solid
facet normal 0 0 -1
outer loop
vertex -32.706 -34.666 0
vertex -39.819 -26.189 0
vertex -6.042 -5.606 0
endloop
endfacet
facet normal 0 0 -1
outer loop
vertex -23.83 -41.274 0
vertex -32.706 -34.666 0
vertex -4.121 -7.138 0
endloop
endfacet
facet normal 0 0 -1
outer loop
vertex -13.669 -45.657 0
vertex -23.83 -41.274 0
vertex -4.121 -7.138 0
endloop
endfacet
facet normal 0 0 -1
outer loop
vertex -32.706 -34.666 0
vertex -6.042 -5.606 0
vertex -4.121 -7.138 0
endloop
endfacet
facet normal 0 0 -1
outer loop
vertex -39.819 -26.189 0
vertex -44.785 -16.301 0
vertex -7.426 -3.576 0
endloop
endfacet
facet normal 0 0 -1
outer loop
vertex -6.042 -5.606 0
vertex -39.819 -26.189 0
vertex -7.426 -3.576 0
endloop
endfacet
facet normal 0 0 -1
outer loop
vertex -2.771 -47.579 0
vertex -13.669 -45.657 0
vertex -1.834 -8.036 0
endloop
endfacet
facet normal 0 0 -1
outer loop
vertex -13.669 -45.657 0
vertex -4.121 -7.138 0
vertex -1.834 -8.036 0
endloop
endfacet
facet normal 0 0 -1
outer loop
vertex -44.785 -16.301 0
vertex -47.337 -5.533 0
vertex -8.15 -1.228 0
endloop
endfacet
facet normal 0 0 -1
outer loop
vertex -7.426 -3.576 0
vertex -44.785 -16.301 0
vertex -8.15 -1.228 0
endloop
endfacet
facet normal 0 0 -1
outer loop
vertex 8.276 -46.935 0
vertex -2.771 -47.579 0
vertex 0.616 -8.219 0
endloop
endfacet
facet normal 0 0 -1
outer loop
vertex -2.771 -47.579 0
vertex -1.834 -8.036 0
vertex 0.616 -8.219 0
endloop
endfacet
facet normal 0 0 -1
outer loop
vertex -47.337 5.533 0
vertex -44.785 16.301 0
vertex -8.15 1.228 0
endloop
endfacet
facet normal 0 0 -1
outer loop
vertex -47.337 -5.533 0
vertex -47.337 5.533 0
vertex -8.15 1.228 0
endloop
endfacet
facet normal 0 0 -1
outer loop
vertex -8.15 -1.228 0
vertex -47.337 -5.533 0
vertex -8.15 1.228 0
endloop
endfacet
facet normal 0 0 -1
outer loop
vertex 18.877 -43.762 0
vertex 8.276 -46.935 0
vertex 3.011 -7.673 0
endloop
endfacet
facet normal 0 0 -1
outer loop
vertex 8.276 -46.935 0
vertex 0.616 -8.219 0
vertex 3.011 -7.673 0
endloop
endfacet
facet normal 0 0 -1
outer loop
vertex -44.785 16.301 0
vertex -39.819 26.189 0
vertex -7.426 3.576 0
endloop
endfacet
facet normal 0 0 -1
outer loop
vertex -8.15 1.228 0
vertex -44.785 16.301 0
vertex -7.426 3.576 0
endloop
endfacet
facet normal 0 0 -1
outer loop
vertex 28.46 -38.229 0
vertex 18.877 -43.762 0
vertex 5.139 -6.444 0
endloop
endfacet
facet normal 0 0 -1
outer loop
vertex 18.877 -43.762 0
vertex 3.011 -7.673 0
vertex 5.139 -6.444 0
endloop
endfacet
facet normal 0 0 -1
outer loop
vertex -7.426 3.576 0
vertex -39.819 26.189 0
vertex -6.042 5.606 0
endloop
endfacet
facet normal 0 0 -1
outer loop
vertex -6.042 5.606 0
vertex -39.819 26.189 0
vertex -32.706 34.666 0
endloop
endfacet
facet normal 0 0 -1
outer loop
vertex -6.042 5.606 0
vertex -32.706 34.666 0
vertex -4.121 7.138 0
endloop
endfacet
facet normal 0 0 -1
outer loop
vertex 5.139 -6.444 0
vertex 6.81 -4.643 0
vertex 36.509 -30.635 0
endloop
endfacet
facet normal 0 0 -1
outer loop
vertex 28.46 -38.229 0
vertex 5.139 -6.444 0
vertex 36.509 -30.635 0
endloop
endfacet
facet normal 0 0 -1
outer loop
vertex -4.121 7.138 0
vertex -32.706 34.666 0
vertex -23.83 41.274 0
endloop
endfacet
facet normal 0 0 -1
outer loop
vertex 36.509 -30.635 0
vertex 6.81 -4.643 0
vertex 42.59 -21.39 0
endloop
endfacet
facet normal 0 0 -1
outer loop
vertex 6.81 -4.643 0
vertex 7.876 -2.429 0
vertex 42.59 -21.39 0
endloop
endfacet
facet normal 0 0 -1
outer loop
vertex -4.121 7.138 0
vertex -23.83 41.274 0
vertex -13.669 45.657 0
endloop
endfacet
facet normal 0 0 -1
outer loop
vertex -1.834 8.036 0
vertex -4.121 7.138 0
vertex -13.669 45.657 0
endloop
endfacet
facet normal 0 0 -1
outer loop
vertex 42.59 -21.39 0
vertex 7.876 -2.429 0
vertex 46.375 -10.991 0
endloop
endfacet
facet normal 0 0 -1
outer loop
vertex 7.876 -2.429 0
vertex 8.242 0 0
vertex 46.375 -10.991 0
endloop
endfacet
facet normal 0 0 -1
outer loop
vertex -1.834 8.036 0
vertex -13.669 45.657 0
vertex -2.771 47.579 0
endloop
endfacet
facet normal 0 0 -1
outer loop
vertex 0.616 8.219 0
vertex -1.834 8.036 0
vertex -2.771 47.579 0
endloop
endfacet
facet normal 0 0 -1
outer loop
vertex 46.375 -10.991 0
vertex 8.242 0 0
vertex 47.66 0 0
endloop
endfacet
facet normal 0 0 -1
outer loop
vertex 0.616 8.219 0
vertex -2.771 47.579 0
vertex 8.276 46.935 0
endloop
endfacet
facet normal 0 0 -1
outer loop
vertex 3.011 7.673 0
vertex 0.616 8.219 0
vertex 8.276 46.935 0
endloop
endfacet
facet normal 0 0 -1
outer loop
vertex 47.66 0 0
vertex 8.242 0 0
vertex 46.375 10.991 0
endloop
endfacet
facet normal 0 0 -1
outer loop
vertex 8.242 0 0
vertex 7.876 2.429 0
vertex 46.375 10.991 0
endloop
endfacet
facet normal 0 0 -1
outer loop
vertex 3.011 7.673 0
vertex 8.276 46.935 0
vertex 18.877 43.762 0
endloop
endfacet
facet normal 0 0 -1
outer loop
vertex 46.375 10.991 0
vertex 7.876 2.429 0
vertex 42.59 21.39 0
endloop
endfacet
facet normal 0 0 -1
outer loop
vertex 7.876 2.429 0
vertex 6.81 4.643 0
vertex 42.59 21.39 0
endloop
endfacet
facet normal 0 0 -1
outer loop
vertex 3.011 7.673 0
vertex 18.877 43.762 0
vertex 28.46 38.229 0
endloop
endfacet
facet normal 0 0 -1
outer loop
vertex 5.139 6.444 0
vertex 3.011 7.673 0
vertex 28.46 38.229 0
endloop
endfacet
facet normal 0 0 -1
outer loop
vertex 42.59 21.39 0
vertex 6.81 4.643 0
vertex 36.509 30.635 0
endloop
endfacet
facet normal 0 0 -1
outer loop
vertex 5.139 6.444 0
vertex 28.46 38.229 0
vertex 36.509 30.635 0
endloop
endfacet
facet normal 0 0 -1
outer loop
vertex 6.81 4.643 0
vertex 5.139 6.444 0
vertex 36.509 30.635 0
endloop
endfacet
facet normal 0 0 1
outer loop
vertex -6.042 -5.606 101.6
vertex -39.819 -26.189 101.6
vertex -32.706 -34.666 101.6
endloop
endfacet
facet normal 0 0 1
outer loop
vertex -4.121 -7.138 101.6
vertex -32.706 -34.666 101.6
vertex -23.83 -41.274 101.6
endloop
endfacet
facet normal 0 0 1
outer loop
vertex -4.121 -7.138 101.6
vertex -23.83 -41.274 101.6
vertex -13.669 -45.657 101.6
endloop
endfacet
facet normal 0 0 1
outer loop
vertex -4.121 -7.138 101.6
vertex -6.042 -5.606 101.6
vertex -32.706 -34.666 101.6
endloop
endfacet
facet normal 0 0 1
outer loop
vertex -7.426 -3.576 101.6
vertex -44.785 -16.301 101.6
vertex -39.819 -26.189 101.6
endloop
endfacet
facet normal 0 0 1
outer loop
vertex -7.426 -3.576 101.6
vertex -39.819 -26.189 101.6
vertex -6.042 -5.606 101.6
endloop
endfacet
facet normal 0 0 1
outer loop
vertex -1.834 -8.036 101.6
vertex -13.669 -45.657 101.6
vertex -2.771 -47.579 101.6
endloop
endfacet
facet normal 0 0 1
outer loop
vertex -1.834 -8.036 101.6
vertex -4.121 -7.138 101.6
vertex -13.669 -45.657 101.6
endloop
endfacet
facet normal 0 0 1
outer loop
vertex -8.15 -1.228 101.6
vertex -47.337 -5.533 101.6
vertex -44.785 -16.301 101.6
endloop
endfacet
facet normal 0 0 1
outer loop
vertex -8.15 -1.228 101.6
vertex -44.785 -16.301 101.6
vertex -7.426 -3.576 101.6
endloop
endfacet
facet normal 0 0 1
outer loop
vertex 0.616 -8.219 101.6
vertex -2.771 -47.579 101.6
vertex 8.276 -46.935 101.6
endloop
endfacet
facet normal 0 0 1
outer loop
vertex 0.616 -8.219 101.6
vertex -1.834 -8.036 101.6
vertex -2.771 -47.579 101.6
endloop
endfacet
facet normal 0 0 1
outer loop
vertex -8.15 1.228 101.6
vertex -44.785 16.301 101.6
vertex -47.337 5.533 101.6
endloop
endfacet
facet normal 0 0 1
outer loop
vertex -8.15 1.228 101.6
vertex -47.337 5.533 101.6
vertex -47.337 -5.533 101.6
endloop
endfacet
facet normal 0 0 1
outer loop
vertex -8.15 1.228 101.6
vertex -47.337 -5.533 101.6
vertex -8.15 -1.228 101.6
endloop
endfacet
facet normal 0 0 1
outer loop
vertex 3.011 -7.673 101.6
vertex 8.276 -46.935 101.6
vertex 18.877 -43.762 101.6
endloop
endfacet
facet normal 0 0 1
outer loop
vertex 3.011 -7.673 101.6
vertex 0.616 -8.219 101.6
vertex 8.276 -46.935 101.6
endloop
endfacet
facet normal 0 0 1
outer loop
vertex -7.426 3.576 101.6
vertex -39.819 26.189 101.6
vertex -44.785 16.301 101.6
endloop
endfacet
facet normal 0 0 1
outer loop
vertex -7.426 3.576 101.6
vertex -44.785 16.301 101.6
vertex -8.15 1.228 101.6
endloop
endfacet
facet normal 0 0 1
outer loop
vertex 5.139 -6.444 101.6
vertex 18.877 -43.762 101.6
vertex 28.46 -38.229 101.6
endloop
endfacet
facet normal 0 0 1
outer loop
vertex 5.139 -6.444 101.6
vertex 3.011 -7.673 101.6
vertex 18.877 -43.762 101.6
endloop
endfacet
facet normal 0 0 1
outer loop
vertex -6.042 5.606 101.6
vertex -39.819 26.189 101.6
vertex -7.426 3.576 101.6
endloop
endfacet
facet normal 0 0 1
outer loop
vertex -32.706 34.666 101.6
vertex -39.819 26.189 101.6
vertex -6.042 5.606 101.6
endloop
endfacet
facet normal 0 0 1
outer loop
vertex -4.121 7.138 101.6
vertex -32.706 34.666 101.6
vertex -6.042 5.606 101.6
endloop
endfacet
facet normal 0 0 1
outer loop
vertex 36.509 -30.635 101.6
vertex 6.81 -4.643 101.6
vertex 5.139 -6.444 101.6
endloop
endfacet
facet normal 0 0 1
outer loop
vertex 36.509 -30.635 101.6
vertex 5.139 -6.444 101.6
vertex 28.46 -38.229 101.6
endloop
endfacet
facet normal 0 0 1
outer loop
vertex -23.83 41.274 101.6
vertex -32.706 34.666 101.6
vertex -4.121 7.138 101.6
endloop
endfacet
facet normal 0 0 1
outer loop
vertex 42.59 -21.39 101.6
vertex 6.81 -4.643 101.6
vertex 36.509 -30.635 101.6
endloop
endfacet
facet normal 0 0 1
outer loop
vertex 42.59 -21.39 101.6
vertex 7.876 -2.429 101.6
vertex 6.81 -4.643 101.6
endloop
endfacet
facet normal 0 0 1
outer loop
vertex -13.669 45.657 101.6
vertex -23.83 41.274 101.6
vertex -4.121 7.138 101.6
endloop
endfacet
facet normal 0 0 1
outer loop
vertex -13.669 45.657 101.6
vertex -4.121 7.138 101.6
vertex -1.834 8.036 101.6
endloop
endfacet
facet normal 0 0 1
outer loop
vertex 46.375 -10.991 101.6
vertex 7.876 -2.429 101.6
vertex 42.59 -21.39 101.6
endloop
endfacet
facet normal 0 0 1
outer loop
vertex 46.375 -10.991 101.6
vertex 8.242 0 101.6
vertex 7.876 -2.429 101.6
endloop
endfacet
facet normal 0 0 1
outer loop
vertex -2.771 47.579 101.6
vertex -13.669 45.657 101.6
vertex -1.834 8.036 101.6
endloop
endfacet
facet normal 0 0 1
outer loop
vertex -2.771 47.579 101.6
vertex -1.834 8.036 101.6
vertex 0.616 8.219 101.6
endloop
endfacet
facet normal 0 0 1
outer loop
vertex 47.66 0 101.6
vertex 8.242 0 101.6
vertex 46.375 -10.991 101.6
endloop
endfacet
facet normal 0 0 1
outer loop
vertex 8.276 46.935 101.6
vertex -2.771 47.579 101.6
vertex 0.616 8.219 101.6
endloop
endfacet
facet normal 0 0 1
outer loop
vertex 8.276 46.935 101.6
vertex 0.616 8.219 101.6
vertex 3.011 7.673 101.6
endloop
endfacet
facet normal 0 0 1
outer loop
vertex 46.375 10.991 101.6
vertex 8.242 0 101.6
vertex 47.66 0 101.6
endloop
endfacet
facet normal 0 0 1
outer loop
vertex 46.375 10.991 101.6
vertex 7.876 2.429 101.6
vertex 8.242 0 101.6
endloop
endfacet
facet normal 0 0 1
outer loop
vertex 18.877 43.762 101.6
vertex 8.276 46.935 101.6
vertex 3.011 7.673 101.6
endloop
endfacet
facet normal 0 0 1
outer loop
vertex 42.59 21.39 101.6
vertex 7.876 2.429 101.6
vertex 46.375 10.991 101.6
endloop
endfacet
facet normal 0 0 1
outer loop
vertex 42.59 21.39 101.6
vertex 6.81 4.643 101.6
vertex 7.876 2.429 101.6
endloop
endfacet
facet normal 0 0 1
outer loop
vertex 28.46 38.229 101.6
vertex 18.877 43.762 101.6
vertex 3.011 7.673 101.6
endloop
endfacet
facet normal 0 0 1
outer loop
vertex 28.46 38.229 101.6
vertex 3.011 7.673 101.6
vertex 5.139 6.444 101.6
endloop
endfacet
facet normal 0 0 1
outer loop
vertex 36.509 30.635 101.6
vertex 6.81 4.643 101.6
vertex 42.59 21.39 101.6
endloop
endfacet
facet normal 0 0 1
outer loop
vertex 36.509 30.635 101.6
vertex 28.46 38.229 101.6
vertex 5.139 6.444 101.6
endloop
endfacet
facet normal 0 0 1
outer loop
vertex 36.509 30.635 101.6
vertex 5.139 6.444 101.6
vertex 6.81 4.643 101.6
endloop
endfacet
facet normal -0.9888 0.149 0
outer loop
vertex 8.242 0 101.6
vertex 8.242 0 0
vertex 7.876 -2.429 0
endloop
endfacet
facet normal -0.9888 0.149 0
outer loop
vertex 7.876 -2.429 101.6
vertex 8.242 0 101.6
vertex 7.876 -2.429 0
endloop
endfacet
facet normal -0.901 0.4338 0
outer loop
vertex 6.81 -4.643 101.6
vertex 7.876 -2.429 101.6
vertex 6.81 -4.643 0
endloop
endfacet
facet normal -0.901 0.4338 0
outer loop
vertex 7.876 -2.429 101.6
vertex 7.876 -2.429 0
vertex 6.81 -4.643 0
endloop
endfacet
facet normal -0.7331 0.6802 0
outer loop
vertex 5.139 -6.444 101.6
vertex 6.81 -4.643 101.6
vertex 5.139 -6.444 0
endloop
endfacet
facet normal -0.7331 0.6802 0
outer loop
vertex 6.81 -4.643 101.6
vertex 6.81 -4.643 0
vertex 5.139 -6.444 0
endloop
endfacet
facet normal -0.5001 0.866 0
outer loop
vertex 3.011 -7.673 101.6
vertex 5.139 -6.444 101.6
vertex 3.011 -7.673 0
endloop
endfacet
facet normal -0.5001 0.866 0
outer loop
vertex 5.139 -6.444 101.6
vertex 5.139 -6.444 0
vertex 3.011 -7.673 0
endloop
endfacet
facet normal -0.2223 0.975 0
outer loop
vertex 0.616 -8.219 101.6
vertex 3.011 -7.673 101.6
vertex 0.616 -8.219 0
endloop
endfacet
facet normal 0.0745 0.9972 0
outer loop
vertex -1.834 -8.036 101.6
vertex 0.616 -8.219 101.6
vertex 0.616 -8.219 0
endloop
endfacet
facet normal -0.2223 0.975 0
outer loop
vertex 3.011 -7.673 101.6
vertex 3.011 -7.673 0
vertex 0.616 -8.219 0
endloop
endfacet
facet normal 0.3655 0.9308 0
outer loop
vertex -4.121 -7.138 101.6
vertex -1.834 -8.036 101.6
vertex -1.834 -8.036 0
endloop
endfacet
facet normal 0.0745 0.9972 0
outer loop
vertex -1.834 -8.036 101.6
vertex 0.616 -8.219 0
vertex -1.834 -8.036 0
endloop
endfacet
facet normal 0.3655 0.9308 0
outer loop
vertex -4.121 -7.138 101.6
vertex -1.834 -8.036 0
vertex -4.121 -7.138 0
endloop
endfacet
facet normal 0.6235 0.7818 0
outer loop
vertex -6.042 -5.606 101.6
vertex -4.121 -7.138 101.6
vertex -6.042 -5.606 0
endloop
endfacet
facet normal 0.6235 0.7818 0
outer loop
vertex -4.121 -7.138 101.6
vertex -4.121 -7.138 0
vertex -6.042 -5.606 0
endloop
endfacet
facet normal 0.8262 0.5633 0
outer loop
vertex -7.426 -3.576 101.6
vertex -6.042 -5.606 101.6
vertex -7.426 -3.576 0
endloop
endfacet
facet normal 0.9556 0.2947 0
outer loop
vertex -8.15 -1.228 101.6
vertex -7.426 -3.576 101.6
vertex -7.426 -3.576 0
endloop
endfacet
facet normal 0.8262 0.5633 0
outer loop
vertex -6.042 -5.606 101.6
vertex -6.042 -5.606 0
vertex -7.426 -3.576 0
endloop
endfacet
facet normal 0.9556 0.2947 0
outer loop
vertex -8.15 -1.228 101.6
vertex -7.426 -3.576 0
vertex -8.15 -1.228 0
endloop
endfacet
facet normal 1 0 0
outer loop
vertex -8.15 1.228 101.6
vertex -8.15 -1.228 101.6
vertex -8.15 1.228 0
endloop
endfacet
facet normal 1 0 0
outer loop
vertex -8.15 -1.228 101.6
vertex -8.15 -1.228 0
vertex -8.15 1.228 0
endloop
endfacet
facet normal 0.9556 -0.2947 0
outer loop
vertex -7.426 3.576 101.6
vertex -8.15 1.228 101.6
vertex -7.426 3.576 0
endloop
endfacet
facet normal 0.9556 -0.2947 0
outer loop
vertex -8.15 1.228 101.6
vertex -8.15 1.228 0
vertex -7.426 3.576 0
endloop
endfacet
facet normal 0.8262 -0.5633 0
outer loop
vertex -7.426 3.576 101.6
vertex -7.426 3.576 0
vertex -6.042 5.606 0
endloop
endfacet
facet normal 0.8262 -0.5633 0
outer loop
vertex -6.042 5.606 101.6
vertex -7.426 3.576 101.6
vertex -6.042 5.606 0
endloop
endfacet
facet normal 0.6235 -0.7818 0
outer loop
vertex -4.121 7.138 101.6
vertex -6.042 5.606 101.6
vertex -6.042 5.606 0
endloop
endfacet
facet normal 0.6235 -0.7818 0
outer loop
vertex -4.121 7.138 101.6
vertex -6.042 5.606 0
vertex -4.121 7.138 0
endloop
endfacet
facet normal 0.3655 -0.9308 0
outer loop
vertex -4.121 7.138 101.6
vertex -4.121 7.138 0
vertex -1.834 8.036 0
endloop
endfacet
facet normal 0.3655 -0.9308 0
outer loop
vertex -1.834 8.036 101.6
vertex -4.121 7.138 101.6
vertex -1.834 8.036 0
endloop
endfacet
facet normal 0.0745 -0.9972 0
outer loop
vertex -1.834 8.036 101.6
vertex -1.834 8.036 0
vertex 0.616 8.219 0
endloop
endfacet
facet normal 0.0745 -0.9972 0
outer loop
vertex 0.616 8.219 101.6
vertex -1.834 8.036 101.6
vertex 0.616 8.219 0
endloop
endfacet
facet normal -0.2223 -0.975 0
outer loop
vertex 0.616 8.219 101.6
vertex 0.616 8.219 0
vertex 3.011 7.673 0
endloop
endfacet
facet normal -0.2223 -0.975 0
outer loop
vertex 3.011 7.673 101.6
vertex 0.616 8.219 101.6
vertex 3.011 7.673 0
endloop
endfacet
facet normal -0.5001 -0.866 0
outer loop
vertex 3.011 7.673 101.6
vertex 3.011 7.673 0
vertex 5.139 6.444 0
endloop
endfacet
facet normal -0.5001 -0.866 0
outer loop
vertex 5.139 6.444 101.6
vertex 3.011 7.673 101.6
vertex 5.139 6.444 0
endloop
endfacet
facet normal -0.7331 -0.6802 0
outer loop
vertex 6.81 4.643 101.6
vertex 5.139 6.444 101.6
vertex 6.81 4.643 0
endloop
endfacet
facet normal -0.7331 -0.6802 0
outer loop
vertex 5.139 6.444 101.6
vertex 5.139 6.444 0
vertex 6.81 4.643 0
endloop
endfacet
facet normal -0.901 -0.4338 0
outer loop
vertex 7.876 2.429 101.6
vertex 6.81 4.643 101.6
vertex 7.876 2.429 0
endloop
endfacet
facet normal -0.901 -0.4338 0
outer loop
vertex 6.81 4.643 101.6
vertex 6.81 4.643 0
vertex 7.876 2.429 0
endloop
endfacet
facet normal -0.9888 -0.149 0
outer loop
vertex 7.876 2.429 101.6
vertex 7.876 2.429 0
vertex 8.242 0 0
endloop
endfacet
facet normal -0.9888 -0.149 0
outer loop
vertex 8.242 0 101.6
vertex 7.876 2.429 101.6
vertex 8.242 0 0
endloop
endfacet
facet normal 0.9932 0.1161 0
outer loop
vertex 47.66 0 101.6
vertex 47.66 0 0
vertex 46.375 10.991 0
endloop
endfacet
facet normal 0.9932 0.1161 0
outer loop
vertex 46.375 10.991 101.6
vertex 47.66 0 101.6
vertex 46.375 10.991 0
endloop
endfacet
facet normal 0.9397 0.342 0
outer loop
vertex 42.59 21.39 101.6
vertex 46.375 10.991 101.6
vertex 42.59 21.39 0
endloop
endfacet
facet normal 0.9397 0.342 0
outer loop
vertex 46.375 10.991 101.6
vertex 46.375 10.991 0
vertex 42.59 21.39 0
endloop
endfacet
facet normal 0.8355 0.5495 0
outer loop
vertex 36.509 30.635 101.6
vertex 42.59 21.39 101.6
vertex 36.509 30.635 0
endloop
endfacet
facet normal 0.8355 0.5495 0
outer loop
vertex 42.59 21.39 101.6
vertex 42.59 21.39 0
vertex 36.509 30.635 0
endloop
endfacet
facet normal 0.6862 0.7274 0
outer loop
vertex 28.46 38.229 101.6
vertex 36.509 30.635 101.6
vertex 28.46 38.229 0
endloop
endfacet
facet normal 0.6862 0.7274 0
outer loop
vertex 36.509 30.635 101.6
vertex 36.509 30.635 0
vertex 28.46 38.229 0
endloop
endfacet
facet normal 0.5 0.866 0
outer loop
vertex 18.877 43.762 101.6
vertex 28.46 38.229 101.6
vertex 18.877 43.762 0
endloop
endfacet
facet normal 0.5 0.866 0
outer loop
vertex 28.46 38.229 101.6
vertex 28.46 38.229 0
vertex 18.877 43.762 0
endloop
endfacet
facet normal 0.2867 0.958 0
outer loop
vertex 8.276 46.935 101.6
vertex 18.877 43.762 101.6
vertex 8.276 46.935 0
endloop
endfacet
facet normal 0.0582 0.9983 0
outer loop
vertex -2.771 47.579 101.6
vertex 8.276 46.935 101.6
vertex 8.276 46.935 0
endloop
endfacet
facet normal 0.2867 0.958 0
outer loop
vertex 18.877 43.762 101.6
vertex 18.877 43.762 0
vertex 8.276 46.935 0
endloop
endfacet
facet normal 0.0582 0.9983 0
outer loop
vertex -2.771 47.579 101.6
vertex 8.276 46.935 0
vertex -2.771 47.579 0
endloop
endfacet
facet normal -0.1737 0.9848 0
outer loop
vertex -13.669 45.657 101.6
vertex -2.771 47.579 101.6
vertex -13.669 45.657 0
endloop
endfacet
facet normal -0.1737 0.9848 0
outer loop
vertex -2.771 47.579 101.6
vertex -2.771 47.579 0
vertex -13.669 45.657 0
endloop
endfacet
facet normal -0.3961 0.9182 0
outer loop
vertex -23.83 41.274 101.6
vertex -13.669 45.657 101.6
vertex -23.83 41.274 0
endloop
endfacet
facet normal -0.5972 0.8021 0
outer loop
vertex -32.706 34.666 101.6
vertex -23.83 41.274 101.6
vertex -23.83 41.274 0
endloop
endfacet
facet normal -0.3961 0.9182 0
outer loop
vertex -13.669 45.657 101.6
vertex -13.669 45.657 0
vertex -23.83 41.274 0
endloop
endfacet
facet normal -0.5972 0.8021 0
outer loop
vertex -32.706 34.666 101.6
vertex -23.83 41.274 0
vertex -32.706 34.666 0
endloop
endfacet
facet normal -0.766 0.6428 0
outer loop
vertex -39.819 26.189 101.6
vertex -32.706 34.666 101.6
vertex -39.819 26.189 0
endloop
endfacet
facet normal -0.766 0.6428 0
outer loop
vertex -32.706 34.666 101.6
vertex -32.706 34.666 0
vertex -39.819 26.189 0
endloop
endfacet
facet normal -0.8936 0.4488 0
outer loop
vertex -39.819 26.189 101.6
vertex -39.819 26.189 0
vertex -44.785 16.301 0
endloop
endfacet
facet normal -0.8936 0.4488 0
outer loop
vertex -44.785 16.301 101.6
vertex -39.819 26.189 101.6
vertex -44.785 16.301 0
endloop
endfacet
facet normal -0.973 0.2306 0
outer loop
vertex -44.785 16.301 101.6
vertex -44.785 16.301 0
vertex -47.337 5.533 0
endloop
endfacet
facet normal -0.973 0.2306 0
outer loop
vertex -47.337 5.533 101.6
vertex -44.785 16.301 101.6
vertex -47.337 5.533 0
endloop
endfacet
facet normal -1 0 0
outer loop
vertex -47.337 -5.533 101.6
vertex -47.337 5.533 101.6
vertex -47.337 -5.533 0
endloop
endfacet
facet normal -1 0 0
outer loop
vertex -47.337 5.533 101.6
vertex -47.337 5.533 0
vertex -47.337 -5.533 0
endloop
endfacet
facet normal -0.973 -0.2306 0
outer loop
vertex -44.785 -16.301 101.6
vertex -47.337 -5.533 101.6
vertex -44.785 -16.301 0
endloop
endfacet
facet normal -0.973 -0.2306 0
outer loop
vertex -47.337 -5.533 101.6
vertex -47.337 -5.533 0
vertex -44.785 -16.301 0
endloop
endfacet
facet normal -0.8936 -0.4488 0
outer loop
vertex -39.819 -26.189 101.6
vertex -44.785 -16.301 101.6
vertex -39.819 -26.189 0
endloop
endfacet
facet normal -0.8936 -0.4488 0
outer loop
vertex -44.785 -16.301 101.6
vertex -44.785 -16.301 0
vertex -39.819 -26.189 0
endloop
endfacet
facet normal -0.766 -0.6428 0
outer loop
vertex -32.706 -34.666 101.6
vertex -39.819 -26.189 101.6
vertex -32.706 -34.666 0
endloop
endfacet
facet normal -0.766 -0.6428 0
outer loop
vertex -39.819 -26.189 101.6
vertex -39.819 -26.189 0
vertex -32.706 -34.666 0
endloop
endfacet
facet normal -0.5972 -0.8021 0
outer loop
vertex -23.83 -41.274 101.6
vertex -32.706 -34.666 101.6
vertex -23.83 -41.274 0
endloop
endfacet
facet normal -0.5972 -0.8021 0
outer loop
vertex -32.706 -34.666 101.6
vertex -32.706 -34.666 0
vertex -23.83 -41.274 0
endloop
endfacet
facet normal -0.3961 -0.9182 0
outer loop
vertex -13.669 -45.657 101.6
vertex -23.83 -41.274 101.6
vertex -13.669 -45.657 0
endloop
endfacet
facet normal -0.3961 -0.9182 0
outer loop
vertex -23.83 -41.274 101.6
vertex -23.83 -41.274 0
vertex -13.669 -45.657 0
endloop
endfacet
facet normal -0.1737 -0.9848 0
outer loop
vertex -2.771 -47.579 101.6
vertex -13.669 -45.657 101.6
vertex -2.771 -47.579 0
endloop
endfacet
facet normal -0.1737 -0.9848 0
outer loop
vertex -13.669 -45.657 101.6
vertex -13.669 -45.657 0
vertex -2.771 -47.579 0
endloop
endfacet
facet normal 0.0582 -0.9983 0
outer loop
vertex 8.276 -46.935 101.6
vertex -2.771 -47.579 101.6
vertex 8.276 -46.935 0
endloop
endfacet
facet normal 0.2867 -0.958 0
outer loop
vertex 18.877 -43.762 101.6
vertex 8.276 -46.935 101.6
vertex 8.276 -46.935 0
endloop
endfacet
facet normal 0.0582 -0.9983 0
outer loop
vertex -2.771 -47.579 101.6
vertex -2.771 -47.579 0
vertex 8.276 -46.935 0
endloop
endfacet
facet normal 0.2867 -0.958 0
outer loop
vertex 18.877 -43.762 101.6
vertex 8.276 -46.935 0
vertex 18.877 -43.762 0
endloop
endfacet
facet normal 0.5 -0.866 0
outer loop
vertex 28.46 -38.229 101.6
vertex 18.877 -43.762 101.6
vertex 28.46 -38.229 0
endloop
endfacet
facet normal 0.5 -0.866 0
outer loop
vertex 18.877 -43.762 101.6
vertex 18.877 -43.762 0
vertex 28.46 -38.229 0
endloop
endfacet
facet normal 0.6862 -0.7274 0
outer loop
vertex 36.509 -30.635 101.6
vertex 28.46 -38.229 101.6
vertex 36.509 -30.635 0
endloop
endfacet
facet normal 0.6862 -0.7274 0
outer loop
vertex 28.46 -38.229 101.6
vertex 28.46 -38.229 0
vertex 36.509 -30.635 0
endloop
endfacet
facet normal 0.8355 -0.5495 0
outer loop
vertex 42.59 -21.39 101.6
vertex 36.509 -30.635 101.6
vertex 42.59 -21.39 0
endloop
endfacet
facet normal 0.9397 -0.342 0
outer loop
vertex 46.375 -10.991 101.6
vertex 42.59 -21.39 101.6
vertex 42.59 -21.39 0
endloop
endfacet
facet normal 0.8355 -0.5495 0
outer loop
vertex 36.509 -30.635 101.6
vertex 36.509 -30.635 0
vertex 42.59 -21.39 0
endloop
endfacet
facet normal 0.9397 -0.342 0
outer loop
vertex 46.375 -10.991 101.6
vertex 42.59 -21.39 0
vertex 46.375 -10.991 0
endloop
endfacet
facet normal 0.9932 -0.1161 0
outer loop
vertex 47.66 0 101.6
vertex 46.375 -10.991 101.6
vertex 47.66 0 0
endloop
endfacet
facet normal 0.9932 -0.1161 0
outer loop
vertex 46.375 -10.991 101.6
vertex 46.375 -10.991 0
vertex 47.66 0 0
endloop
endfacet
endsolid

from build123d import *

# Parameters (mm, degrees)
F0_R     = 47.659552
F2_DEPTH = 101.6
F1_R     = 13.037105
F3_DEPTH = 101.6
F4_R     = 8.24229
F5_DEPTH = 101.6


with BuildPart() as f2:
    # F0 (on Top) → F2 (new body)
    with BuildSketch(Plane.XY):
        Circle(F0_R)
    extrude(amount=F2_DEPTH)

    # F1 (on face) → F3 (join)
    with BuildSketch(Plane.XY):
        Circle(F1_R)
    extrude(amount=F3_DEPTH)

    # F4 (on face) → F5 (cut)
    with BuildSketch(Plane(origin=(0, 0, 0), x_dir=(1, 0, 0), z_dir=(0, 0, -1))):
        Circle(F4_R)
    extrude(amount=-F5_DEPTH, mode=Mode.SUBTRACT)


solid = f2.part
